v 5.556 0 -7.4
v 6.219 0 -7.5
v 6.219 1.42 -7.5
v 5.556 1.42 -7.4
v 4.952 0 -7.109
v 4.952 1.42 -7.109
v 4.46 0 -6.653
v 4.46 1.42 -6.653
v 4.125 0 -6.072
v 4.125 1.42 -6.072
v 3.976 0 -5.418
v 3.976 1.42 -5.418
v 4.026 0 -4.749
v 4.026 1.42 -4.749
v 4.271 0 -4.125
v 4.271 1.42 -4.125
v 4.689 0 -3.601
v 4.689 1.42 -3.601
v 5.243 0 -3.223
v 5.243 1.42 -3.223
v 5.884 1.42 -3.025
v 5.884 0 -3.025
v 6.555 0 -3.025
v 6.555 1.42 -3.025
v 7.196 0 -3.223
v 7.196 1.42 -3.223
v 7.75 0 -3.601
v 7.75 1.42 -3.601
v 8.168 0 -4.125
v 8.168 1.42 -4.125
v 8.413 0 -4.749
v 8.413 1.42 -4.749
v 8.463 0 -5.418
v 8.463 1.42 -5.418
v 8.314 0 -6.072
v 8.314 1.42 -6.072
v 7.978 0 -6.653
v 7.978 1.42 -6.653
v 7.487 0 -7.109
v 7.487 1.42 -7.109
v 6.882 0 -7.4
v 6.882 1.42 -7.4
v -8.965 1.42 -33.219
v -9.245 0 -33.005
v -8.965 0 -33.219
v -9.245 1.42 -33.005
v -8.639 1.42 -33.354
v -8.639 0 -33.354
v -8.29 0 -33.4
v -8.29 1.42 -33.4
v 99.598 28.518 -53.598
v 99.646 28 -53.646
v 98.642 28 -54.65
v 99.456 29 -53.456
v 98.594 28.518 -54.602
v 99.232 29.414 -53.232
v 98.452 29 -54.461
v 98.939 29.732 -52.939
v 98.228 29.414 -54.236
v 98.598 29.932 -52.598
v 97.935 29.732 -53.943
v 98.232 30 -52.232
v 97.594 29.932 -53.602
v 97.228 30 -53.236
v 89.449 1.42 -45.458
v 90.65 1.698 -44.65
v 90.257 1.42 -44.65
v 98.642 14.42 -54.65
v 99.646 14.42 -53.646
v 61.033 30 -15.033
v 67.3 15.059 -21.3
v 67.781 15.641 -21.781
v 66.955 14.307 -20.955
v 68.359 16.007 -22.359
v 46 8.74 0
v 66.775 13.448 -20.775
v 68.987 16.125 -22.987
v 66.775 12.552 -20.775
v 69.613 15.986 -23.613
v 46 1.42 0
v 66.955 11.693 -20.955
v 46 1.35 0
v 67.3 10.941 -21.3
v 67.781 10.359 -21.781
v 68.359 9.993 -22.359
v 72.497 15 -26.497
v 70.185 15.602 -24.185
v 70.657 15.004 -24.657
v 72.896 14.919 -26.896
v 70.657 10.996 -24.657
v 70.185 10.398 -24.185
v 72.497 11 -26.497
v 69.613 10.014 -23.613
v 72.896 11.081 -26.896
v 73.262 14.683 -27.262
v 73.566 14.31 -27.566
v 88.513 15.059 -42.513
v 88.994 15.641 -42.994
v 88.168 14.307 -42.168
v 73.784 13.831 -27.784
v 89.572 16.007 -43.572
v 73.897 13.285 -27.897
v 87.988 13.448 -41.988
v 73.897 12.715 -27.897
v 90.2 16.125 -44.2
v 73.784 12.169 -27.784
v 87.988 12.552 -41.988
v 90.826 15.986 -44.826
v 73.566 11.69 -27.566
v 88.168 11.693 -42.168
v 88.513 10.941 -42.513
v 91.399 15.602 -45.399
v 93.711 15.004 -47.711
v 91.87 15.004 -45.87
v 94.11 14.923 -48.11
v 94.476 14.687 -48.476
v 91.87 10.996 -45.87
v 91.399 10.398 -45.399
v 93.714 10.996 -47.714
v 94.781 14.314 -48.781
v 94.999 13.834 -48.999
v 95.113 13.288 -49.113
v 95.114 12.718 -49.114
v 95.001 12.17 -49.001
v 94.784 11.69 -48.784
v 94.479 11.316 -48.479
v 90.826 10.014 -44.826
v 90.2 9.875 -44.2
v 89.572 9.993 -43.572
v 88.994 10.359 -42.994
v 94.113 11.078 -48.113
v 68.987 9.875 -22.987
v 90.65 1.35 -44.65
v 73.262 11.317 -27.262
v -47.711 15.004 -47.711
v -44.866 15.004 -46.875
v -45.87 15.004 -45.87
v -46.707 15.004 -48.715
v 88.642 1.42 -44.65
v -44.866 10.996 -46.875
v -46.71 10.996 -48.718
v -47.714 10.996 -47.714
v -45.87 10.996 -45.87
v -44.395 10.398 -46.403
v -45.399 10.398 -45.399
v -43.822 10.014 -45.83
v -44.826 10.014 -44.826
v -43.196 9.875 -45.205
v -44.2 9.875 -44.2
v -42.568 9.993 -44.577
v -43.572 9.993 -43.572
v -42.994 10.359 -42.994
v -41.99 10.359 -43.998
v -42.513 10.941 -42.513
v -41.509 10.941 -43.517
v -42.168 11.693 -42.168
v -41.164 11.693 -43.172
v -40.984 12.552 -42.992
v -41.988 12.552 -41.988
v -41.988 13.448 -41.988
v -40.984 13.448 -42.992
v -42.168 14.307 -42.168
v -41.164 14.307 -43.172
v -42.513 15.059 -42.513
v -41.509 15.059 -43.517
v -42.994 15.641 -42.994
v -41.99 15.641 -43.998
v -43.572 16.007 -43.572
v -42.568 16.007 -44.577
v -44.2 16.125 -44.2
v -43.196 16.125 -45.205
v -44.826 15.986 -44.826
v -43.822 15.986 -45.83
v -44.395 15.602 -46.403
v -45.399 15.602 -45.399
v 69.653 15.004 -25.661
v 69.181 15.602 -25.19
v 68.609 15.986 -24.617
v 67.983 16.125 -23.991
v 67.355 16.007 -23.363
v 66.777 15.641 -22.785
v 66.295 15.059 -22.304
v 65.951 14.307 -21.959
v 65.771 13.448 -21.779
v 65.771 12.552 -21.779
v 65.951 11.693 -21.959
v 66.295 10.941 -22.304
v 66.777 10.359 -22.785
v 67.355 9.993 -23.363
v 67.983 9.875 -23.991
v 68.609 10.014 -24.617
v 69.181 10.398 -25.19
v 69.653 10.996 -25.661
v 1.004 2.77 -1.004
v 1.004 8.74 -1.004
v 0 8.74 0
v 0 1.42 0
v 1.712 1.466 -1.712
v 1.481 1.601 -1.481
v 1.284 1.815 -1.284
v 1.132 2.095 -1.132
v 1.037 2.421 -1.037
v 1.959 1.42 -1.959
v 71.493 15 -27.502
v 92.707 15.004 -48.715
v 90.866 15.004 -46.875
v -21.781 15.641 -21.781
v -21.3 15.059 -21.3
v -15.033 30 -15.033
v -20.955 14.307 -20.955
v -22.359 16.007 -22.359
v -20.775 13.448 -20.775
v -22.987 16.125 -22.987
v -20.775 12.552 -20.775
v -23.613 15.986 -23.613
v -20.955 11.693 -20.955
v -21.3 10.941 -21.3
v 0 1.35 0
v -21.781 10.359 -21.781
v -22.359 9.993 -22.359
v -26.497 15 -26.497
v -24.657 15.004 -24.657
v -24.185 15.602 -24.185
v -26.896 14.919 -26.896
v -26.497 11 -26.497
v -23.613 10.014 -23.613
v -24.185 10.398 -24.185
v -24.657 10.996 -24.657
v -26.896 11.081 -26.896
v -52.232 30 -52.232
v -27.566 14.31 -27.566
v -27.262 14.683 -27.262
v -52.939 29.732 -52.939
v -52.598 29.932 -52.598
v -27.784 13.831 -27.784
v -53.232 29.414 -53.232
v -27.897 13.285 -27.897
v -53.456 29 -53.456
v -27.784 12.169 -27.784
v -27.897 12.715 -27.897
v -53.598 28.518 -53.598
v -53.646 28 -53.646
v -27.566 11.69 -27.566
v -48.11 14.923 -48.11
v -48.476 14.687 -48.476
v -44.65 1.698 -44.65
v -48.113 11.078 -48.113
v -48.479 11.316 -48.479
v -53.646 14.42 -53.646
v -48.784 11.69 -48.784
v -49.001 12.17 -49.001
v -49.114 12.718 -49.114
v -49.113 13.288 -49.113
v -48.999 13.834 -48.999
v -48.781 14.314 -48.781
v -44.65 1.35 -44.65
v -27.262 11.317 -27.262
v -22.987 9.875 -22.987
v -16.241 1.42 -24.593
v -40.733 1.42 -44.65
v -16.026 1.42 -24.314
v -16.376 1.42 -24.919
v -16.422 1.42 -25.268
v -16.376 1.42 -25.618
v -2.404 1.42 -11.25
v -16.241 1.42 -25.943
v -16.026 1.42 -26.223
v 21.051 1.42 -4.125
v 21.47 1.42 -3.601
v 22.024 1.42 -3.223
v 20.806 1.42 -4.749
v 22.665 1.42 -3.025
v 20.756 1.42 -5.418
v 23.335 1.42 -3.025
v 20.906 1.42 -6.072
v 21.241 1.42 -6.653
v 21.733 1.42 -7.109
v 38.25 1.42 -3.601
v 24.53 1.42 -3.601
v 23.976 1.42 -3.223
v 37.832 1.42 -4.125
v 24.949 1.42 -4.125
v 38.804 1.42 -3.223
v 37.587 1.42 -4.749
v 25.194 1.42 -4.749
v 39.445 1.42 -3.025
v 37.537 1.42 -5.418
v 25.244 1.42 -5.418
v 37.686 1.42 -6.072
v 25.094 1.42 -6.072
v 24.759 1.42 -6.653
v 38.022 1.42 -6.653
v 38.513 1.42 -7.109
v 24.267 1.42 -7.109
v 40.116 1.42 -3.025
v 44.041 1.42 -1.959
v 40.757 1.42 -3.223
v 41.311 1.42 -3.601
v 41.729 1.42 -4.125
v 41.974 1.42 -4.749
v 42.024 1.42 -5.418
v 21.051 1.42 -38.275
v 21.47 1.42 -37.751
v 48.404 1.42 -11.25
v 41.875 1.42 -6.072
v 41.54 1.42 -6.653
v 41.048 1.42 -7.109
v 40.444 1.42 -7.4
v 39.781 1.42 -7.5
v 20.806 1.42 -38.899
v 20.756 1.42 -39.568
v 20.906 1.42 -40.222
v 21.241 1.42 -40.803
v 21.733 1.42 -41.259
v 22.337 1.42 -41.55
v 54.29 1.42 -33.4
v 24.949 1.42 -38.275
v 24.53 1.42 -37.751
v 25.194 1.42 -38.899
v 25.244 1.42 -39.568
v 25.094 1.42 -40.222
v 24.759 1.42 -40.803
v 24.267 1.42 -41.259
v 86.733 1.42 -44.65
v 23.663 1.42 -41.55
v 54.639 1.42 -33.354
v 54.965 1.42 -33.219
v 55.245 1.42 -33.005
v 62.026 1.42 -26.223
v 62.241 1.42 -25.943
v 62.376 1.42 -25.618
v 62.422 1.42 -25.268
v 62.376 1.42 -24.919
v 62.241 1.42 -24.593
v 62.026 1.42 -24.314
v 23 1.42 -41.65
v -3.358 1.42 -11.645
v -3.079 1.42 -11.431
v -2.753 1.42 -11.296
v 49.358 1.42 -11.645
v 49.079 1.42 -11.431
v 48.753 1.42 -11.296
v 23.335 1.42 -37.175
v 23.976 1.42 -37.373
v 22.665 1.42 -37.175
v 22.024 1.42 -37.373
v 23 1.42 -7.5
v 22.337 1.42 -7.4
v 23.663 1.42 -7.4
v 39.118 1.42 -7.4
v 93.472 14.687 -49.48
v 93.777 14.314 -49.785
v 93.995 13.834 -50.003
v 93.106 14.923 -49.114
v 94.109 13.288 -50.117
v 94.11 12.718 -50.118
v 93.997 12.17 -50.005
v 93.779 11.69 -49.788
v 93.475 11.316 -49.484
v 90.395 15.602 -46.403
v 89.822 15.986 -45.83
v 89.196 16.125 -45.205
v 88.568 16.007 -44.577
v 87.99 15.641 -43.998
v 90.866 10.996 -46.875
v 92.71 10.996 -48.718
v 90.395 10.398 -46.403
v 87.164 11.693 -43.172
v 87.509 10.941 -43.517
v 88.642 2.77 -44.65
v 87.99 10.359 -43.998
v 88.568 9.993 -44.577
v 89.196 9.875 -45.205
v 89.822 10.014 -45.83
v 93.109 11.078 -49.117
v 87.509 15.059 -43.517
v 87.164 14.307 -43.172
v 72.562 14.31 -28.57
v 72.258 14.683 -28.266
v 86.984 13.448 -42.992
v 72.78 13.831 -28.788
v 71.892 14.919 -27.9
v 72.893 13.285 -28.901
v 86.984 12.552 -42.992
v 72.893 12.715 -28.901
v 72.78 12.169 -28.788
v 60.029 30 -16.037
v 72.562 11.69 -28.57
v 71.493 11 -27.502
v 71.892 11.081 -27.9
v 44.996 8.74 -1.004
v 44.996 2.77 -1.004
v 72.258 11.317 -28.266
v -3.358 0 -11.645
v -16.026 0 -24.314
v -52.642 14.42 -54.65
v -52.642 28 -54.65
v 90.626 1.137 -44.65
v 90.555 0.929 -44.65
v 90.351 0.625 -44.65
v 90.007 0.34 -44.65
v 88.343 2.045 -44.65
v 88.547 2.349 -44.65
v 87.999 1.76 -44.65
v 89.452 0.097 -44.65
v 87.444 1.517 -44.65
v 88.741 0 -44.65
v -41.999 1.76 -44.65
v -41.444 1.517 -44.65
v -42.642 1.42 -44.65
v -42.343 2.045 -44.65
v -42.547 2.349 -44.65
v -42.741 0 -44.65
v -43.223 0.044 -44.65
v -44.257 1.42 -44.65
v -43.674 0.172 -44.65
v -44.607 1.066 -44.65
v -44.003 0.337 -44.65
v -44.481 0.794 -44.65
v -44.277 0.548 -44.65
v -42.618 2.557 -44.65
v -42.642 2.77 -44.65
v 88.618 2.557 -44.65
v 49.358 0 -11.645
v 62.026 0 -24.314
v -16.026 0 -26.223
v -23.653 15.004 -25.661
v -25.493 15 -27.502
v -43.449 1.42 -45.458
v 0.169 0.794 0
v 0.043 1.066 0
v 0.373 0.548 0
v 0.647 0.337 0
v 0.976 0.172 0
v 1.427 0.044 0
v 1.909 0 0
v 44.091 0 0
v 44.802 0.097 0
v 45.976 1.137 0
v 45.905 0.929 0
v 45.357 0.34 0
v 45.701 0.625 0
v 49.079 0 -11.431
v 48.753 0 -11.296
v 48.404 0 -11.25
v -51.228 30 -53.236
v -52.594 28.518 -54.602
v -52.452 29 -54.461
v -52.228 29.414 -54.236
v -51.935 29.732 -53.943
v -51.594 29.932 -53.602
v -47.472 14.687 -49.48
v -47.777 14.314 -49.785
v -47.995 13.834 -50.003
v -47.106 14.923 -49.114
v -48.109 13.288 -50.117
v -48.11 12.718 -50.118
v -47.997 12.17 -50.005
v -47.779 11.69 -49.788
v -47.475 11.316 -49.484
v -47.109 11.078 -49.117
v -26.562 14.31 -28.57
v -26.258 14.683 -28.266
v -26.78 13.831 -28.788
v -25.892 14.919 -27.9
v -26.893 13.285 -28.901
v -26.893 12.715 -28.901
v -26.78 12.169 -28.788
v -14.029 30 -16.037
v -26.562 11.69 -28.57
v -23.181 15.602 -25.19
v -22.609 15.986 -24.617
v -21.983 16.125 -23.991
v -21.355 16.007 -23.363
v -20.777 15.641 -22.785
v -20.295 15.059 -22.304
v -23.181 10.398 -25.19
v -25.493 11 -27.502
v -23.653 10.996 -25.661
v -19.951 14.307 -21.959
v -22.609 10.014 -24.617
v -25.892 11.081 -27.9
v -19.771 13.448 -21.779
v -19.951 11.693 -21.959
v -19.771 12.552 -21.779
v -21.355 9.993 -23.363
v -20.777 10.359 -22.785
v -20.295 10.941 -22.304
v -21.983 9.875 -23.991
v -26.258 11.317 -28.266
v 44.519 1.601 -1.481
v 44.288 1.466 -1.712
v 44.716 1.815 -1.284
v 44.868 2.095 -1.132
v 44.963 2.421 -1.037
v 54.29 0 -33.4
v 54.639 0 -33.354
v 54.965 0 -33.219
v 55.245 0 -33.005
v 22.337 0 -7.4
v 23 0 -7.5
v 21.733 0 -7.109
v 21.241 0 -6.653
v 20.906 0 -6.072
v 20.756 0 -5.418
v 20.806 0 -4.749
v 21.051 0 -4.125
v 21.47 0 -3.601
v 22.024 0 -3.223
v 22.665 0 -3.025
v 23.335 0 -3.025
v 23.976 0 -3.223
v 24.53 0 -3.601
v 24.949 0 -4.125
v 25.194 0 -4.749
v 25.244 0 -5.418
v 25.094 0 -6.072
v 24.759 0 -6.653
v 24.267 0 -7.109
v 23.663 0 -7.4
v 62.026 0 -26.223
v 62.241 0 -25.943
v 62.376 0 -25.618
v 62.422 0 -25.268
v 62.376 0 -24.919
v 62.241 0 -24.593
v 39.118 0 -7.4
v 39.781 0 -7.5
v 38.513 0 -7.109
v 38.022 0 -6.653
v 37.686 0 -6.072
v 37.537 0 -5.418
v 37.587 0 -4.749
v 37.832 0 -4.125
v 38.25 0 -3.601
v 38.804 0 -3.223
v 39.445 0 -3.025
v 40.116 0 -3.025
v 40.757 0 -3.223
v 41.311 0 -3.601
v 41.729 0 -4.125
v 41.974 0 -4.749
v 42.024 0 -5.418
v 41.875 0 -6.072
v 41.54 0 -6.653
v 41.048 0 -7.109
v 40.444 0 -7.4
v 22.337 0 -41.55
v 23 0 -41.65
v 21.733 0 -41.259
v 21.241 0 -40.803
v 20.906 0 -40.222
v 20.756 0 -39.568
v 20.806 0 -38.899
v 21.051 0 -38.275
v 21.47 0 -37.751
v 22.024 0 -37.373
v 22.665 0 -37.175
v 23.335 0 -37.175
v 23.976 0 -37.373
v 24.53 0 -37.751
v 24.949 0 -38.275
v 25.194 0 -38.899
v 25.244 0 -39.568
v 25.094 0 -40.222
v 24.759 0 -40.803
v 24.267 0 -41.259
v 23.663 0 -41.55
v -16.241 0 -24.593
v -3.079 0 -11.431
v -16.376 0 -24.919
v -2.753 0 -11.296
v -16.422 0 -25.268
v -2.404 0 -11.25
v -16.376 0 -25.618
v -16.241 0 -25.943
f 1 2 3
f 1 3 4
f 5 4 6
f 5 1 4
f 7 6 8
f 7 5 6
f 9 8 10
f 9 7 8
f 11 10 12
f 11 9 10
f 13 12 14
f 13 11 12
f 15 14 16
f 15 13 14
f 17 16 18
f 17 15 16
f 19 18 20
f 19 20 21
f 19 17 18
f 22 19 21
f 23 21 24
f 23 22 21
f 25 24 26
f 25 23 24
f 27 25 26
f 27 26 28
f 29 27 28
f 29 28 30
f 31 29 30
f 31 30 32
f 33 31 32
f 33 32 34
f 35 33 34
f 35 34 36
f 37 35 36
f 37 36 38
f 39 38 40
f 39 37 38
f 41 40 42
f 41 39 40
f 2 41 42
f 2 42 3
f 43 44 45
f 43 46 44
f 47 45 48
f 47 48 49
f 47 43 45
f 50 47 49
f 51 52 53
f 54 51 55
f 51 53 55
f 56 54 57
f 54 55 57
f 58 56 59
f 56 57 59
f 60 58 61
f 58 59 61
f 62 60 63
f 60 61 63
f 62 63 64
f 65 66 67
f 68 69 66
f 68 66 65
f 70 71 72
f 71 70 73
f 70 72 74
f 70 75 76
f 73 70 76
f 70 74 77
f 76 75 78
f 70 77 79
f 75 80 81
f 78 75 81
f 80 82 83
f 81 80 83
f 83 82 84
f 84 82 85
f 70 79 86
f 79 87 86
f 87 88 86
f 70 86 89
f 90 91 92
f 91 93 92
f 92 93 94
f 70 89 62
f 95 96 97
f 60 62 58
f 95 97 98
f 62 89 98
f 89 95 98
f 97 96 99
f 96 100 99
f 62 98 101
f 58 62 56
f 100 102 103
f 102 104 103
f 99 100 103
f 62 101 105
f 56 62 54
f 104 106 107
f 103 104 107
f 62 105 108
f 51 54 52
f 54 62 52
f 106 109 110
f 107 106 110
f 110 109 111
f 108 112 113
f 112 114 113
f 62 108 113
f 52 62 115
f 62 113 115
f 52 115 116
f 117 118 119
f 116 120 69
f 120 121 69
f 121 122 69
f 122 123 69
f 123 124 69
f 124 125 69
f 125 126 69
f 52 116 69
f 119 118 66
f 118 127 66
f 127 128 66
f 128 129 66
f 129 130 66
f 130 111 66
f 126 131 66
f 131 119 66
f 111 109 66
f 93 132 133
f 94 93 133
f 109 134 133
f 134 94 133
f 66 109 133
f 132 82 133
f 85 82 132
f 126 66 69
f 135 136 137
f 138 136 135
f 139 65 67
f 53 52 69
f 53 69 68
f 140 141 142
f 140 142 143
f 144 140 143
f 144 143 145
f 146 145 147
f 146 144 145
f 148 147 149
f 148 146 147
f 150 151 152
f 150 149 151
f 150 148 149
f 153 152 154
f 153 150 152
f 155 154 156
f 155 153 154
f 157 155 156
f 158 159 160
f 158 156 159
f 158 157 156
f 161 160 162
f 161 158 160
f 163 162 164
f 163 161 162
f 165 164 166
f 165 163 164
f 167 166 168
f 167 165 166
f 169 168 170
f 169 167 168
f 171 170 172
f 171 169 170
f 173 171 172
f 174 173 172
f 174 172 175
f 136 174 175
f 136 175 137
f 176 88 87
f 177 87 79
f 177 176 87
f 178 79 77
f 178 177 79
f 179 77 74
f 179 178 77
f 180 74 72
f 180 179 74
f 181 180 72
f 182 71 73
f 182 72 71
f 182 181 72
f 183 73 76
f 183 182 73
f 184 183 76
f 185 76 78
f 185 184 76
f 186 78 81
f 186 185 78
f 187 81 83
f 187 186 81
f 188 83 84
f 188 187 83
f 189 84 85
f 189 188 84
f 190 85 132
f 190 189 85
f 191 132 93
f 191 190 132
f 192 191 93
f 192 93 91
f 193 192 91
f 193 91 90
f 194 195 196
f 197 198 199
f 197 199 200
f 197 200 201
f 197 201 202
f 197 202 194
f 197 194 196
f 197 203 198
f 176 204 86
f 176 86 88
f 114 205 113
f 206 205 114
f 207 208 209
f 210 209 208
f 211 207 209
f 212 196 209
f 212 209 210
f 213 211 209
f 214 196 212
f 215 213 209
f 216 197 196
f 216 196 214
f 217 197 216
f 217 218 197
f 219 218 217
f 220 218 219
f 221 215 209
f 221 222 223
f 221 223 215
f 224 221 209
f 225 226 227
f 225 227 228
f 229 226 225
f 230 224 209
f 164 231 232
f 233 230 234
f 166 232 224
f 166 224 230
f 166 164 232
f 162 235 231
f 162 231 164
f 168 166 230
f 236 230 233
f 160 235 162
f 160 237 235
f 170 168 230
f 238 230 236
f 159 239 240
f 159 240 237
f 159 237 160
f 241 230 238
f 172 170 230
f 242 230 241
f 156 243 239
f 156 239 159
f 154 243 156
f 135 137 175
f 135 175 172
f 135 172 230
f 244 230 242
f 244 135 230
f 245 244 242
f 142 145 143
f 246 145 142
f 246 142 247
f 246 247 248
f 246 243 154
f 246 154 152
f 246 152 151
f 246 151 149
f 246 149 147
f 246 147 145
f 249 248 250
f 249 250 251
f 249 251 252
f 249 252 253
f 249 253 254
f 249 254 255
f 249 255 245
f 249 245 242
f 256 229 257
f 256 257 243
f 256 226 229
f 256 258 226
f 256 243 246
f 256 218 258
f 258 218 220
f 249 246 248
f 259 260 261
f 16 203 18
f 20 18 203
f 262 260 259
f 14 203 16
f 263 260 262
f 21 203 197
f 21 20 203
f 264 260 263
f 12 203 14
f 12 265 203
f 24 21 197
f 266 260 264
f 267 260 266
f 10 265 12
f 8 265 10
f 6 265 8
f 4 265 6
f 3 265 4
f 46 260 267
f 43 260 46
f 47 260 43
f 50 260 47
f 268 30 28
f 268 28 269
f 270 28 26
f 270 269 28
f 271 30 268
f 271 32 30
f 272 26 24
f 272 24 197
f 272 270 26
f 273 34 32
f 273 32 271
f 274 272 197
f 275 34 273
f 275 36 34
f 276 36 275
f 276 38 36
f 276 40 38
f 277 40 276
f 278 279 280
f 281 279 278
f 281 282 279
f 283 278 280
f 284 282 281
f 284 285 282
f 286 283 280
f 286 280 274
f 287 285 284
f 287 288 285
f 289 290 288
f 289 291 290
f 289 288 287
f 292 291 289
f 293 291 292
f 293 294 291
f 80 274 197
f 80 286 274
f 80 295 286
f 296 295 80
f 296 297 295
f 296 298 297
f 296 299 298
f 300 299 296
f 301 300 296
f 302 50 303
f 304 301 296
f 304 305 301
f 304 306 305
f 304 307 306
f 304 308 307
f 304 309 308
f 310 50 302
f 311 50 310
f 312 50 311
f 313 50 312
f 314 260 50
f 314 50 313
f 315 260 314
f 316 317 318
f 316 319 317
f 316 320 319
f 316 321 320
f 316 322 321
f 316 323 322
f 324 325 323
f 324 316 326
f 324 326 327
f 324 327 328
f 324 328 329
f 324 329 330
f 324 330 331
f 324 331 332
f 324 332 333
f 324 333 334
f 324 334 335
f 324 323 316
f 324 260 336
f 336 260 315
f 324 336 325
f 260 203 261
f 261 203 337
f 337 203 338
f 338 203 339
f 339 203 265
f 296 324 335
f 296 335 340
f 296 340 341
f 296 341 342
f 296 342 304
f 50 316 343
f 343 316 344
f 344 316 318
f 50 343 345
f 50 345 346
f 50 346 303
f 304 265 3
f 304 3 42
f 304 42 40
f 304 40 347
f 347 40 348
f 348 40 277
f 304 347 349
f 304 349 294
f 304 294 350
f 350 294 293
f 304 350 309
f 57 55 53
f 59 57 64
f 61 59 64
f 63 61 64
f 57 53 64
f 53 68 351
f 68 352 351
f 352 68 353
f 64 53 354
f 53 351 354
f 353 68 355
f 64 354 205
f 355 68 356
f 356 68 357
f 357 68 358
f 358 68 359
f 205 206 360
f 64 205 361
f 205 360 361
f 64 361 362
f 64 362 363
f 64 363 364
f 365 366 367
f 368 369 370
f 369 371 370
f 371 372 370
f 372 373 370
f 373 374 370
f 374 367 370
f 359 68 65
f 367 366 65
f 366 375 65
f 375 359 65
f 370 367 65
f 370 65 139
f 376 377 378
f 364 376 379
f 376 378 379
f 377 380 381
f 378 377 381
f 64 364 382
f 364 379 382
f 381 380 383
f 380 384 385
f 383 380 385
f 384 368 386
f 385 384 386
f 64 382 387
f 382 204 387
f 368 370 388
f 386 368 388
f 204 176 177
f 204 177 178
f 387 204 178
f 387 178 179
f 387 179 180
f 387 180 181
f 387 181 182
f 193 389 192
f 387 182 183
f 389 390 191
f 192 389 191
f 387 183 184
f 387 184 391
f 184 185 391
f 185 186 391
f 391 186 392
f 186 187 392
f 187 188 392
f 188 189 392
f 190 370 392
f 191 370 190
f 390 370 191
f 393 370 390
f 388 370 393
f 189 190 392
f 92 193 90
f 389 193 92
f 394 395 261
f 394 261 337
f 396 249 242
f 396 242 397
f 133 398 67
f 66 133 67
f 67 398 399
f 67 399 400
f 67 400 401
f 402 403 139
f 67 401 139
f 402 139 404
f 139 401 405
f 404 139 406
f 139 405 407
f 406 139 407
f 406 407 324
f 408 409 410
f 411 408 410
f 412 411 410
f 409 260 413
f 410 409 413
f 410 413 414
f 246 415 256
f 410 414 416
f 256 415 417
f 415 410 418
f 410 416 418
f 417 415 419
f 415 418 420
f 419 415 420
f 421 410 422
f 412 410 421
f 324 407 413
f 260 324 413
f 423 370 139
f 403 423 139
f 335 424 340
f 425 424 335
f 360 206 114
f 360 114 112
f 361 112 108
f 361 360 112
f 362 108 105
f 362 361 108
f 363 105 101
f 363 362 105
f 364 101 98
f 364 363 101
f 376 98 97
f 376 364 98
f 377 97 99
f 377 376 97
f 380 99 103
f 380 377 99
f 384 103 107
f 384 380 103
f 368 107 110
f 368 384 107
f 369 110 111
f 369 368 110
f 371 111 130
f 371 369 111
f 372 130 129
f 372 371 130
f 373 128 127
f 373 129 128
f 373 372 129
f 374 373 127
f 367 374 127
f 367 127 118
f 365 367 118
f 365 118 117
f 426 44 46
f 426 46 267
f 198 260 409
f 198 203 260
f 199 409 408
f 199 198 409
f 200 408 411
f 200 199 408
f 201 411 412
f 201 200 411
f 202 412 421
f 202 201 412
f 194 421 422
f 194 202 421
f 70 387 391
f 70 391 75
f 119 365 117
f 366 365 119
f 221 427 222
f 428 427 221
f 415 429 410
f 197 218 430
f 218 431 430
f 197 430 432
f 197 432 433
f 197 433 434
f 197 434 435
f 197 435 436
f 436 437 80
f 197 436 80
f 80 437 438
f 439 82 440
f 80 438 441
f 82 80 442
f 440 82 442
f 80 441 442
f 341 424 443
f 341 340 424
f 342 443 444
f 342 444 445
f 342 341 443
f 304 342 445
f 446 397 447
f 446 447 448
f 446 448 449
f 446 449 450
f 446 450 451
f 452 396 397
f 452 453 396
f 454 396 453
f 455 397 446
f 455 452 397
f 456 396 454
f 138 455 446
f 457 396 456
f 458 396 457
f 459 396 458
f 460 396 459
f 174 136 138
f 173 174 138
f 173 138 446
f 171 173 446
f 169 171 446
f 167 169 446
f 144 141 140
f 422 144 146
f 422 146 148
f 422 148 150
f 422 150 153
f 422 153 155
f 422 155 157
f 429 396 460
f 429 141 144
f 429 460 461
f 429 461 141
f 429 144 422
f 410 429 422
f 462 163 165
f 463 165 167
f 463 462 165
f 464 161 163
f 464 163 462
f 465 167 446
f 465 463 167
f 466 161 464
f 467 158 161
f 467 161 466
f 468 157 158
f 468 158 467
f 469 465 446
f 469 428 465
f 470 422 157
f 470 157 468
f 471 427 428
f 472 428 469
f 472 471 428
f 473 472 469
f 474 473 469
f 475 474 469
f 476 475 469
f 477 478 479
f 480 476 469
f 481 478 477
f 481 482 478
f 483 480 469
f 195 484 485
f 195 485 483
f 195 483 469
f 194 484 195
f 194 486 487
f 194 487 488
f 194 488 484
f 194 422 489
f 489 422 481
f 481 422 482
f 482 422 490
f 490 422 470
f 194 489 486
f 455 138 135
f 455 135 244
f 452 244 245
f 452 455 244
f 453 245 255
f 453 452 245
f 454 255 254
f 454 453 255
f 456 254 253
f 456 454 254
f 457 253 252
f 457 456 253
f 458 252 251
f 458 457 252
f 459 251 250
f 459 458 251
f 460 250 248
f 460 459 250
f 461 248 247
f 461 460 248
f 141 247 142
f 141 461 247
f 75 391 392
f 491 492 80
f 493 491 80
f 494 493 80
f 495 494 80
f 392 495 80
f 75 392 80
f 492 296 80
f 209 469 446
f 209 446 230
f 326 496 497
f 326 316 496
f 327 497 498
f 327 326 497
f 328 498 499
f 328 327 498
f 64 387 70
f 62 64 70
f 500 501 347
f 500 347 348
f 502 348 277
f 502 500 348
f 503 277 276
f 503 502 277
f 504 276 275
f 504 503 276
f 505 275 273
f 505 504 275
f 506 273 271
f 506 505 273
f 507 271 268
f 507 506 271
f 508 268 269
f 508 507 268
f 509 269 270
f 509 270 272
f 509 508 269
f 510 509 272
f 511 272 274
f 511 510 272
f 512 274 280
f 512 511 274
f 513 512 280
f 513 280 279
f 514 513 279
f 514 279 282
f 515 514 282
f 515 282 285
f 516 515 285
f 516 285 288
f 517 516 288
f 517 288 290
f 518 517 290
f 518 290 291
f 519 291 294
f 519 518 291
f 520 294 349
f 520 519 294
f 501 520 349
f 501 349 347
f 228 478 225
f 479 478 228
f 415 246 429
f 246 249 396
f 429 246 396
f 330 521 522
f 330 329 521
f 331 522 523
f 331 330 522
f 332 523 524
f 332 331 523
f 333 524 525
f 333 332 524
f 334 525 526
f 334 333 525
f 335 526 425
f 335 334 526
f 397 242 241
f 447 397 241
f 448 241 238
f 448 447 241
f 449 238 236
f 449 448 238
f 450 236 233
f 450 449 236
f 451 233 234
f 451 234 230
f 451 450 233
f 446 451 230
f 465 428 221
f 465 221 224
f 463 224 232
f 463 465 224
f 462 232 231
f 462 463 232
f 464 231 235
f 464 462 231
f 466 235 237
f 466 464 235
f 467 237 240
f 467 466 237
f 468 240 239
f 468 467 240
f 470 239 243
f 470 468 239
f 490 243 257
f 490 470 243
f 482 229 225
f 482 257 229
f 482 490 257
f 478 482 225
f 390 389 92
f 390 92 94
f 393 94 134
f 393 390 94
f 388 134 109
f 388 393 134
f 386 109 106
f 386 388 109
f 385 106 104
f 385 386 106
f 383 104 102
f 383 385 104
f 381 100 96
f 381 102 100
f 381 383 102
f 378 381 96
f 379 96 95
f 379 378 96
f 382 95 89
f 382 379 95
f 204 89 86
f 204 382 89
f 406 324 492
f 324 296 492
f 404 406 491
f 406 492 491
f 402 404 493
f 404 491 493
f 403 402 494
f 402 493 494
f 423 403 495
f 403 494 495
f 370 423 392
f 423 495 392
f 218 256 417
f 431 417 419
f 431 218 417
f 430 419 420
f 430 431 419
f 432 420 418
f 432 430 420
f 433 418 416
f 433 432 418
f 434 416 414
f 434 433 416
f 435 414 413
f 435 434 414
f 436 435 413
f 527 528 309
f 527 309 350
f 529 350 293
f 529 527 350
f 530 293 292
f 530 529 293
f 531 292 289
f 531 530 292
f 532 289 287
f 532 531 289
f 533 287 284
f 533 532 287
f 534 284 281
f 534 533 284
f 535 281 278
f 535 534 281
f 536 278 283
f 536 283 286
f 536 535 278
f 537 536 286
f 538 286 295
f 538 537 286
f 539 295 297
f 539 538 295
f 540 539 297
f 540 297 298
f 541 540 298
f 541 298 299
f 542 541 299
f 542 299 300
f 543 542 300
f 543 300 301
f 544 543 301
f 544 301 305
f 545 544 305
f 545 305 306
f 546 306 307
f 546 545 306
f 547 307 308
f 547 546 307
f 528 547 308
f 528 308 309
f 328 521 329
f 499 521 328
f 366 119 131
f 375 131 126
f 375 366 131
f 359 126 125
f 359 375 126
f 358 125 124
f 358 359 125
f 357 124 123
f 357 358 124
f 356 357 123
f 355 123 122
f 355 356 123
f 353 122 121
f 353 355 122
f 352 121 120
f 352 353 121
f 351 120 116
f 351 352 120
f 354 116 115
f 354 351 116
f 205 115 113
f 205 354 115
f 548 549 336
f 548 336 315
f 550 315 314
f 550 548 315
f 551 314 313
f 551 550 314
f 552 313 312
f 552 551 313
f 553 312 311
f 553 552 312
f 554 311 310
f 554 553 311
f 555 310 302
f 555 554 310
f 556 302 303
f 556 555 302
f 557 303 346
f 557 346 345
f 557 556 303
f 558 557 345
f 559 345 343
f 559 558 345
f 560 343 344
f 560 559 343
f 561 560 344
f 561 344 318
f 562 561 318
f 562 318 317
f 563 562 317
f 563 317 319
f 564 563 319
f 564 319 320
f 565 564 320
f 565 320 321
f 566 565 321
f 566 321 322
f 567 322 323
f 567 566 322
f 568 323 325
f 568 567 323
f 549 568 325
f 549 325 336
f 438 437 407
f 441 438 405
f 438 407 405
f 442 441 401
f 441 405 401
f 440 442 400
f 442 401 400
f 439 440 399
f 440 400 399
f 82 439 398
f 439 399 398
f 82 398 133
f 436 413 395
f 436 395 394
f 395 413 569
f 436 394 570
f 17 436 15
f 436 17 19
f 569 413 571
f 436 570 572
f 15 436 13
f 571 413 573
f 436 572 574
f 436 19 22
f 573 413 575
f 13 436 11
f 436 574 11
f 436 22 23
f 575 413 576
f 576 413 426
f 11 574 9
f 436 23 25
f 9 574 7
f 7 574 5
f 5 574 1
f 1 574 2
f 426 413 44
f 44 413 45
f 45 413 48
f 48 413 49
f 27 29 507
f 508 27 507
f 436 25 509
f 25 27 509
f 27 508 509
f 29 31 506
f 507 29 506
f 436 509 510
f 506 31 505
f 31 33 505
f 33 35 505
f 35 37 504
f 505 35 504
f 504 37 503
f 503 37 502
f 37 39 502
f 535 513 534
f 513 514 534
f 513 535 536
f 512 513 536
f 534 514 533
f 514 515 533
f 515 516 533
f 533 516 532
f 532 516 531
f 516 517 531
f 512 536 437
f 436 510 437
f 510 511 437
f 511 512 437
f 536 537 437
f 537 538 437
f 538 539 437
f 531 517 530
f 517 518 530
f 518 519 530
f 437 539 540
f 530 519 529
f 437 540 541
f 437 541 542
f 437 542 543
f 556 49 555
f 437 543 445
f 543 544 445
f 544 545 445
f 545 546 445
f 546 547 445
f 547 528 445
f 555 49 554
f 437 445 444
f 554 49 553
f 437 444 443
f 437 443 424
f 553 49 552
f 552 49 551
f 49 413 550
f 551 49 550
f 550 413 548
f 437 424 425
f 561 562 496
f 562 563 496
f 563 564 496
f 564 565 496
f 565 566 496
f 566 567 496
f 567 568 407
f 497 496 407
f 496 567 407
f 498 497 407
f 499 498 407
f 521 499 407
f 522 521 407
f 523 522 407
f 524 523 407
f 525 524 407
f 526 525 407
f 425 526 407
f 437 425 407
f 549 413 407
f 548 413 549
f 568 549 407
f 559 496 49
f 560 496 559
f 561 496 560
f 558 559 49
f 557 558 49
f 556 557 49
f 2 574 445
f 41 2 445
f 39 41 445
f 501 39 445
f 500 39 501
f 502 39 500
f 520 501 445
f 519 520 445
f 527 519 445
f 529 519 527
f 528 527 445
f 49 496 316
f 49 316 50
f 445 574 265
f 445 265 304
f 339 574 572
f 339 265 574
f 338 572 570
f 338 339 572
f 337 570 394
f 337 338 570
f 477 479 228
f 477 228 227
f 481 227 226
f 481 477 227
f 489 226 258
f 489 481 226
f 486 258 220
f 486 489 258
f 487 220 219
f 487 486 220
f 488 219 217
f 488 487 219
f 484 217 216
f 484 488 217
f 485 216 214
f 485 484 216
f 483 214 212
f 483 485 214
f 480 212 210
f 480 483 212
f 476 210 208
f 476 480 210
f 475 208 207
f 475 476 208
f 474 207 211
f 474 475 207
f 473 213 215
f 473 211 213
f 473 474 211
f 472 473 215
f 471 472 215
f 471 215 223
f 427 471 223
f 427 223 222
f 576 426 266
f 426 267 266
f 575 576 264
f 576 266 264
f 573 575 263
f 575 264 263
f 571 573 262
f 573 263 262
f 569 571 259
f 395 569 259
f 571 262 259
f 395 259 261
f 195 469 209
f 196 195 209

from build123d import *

# Parameters (mm, degrees)
SKETCH1_R                   = 2.25
BASEBOSS_EXTRUDE1_DEPTH     = 1.42
WINGBOSS_EXTRUDE2_DEPTH     = 28.58
FRONTCHAMFER1_SIZE          = 21.26
BACKCHAMFER3_SIZE           = 13
BACKCORNERFILLET1_R         = 2
RIGHTWINGCUT_EXTRUDE1_DEPTH = 117.224315421
LEFTWINGCUT_EXTRUDE2_DEPTH  = 114.155281671
OUTSIDEWINGFILLET2_R        = 1.35
INSIDEWINGFILLET3_R         = 1.35
INSIDECUTOUTFILLET4_R       = 1.35


with BuildPart() as part:
    # Sketch1 → BaseBoss-Extrude1 (new body)
    with BuildSketch(Plane(origin=(0, 0, 0), x_dir=(1, 0, 0), z_dir=(0, 1, 0))):
        Polygon((0, 0), (46, 0), (90.65, 44.65), (-44.65, 44.65), align=None)
        with Locations(Location((23, 39.4, 0), (0, 0, 90))):
            Circle(SKETCH1_R, mode=Mode.SUBTRACT)
        with Locations(Location((23, 5.25, 0), (0, 0, 90))):
            Circle(SKETCH1_R, mode=Mode.SUBTRACT)
        with Locations(Location((39.780728009, 5.25, 0), (0, 0, 90))):
            Circle(SKETCH1_R, mode=Mode.SUBTRACT)
        with Locations(Location((6.219271991, 5.25, 0), (0, 0, 90))):
            Circle(SKETCH1_R, mode=Mode.SUBTRACT)
        Polygon((-16.980980541, 25.268272016), (-2.962708524, 11.25), (48.962708524, 11.25), (62.980980541, 25.268272016), (54.849252557, 33.4), (-8.849252557, 33.4), align=None, mode=Mode.SUBTRACT)
    extrude(amount=BASEBOSS_EXTRUDE1_DEPTH)

    # Sketch2 → WingBoss-Extrude2 (add)
    with BuildSketch(Plane(origin=(0, 1.42, 0), x_dir=(1, 0, 0), z_dir=(0, 1, 0))):
        Polygon((-52.641816741, 54.65), (1.004091629, 1.004091629), (0, 0), (-53.645908371, 53.645908371), align=None)
        Polygon((44.995908371, 1.004091629), (46, 0), (99.645908371, 53.645908371), (98.641816741, 54.65), align=None)
    extrude(amount=WINGBOSS_EXTRUDE2_DEPTH)

    # FrontChamfer1
    frontchamfer1_edges = [part.edges().sort_by_distance(p)[0] for p in [
        (45.497954185, 30, -0.502045815),
        (0.502045815, 30, -0.502045815),
    ]]
    chamfer(frontchamfer1_edges, length=FRONTCHAMFER1_SIZE)

    # BackChamfer3
    backchamfer3_edges = [part.edges().sort_by_distance(p)[0] for p in [
        (-53.143862556, 1.42, -54.147954185),
        (99.143862556, 1.42, -54.147954185),
    ]]
    chamfer(backchamfer3_edges, length=BACKCHAMFER3_SIZE)

    # BackCornerFillet1
    backcornerfillet1_edges = [part.edges().sort_by_distance(p)[0] for p in [
        (99.143862556, 30, -54.147954185),
        (-53.143862556, 30, -54.147954185),
    ]]
    fillet(backcornerfillet1_edges, radius=BACKCORNERFILLET1_R)

    # Sketch3 → RightWingCut-Extrude1 (cut, through all)
    with BuildSketch(Plane(origin=(1.004091629, 0, -1.004091629), x_dir=(-0.7071067811865479, 0, -0.7071067811865471), z_dir=(0.7071067811865471, 0, -0.7071067811865479))):
        with BuildLine():
            Line((64.870634402, 15.004344422), (67.473088065, 15.004351159))
            ThreePointArc((67.473088065, 15.004351159), (69.47743754, 13.002598346), (67.478284754, 10.995655578))
            Line((67.478284754, 10.995655578), (64.870634402, 10.995655578))
            ThreePointArc((64.870634402, 10.995655578), (59.348088065, 13), (64.870634402, 15.004344422))
        make_face()
        with BuildLine():
            Line((34.870634402, 15.004344422), (37.473088065, 15))
            ThreePointArc((37.473088065, 15), (39.473088065, 13), (37.473088065, 11))
            Line((37.473088065, 11), (34.870634402, 10.995655578))
            ThreePointArc((34.870634402, 10.995655578), (29.348088065, 13), (34.870634402, 15.004344422))
        make_face()
    extrude(amount=-RIGHTWINGCUT_EXTRUDE1_DEPTH, mode=Mode.SUBTRACT)

    # Sketch4 → LeftWingCut-Extrude2 (cut, through all)
    with BuildSketch(Plane(origin=(21.995908371, 0, 21.995908371), x_dir=(-0.7071067811865476, 0, 0.7071067811865476), z_dir=(-0.7071067811865476, 0, -0.7071067811865476))):
        with BuildLine():
            Line((-97.397545502, 10.995654579), (-100.005197879, 10.995654579))
            ThreePointArc((-100.005197879, 10.995654579), (-102.004350476, 13.002598942), (-100, 15.004352161))
            Line((-100, 15.004352161), (-97.397545502, 15.004345421))
            ThreePointArc((-97.397545502, 15.004345421), (-91.875, 13), (-97.397545502, 10.995654579))
        make_face()
        with BuildLine():
            Line((-67.397545502, 10.995654579), (-70, 11))
            ThreePointArc((-70, 11), (-72, 13), (-70, 15))
            Line((-70, 15), (-67.397545502, 15.004345421))
            ThreePointArc((-67.397545502, 15.004345421), (-61.875, 13), (-67.397545502, 10.995654579))
        make_face()
    extrude(amount=-LEFTWINGCUT_EXTRUDE2_DEPTH, mode=Mode.SUBTRACT)

    # outsideWingFillet2
    outsidewingfillet2_edges = [part.edges().sort_by_distance(p)[0] for p in [
        (68.325, 0, -22.325),
        (-22.325, 0, -22.325),
    ]]
    fillet(outsidewingfillet2_edges, radius=OUTSIDEWINGFILLET2_R)

    # InsideWingFillet3
    insidewingfillet3_edges = [part.edges().sort_by_distance(p)[0] for p in [
        (66.818862556, 1.42, -22.827045815),
        (-20.818862556, 1.42, -22.827045815),
    ]]
    fillet(insidewingfillet3_edges, radius=INSIDEWINGFILLET3_R)

    # InsideCutoutFillet4
    insidecutoutfillet4_edges = [part.edges().sort_by_distance(p)[0] for p in [
        (48.962708524, 0.71, -11.25),
        (62.980980541, 0.71, -25.268272016),
        (54.849252557, 0.71, -33.4),
        (-8.849252557, 0.71, -33.4),
        (-16.980980541, 0.71, -25.268272016),
        (-2.962708524, 0.71, -11.25),
    ]]
    fillet(insidecutoutfillet4_edges, radius=INSIDECUTOUTFILLET4_R)


solid = part.part
